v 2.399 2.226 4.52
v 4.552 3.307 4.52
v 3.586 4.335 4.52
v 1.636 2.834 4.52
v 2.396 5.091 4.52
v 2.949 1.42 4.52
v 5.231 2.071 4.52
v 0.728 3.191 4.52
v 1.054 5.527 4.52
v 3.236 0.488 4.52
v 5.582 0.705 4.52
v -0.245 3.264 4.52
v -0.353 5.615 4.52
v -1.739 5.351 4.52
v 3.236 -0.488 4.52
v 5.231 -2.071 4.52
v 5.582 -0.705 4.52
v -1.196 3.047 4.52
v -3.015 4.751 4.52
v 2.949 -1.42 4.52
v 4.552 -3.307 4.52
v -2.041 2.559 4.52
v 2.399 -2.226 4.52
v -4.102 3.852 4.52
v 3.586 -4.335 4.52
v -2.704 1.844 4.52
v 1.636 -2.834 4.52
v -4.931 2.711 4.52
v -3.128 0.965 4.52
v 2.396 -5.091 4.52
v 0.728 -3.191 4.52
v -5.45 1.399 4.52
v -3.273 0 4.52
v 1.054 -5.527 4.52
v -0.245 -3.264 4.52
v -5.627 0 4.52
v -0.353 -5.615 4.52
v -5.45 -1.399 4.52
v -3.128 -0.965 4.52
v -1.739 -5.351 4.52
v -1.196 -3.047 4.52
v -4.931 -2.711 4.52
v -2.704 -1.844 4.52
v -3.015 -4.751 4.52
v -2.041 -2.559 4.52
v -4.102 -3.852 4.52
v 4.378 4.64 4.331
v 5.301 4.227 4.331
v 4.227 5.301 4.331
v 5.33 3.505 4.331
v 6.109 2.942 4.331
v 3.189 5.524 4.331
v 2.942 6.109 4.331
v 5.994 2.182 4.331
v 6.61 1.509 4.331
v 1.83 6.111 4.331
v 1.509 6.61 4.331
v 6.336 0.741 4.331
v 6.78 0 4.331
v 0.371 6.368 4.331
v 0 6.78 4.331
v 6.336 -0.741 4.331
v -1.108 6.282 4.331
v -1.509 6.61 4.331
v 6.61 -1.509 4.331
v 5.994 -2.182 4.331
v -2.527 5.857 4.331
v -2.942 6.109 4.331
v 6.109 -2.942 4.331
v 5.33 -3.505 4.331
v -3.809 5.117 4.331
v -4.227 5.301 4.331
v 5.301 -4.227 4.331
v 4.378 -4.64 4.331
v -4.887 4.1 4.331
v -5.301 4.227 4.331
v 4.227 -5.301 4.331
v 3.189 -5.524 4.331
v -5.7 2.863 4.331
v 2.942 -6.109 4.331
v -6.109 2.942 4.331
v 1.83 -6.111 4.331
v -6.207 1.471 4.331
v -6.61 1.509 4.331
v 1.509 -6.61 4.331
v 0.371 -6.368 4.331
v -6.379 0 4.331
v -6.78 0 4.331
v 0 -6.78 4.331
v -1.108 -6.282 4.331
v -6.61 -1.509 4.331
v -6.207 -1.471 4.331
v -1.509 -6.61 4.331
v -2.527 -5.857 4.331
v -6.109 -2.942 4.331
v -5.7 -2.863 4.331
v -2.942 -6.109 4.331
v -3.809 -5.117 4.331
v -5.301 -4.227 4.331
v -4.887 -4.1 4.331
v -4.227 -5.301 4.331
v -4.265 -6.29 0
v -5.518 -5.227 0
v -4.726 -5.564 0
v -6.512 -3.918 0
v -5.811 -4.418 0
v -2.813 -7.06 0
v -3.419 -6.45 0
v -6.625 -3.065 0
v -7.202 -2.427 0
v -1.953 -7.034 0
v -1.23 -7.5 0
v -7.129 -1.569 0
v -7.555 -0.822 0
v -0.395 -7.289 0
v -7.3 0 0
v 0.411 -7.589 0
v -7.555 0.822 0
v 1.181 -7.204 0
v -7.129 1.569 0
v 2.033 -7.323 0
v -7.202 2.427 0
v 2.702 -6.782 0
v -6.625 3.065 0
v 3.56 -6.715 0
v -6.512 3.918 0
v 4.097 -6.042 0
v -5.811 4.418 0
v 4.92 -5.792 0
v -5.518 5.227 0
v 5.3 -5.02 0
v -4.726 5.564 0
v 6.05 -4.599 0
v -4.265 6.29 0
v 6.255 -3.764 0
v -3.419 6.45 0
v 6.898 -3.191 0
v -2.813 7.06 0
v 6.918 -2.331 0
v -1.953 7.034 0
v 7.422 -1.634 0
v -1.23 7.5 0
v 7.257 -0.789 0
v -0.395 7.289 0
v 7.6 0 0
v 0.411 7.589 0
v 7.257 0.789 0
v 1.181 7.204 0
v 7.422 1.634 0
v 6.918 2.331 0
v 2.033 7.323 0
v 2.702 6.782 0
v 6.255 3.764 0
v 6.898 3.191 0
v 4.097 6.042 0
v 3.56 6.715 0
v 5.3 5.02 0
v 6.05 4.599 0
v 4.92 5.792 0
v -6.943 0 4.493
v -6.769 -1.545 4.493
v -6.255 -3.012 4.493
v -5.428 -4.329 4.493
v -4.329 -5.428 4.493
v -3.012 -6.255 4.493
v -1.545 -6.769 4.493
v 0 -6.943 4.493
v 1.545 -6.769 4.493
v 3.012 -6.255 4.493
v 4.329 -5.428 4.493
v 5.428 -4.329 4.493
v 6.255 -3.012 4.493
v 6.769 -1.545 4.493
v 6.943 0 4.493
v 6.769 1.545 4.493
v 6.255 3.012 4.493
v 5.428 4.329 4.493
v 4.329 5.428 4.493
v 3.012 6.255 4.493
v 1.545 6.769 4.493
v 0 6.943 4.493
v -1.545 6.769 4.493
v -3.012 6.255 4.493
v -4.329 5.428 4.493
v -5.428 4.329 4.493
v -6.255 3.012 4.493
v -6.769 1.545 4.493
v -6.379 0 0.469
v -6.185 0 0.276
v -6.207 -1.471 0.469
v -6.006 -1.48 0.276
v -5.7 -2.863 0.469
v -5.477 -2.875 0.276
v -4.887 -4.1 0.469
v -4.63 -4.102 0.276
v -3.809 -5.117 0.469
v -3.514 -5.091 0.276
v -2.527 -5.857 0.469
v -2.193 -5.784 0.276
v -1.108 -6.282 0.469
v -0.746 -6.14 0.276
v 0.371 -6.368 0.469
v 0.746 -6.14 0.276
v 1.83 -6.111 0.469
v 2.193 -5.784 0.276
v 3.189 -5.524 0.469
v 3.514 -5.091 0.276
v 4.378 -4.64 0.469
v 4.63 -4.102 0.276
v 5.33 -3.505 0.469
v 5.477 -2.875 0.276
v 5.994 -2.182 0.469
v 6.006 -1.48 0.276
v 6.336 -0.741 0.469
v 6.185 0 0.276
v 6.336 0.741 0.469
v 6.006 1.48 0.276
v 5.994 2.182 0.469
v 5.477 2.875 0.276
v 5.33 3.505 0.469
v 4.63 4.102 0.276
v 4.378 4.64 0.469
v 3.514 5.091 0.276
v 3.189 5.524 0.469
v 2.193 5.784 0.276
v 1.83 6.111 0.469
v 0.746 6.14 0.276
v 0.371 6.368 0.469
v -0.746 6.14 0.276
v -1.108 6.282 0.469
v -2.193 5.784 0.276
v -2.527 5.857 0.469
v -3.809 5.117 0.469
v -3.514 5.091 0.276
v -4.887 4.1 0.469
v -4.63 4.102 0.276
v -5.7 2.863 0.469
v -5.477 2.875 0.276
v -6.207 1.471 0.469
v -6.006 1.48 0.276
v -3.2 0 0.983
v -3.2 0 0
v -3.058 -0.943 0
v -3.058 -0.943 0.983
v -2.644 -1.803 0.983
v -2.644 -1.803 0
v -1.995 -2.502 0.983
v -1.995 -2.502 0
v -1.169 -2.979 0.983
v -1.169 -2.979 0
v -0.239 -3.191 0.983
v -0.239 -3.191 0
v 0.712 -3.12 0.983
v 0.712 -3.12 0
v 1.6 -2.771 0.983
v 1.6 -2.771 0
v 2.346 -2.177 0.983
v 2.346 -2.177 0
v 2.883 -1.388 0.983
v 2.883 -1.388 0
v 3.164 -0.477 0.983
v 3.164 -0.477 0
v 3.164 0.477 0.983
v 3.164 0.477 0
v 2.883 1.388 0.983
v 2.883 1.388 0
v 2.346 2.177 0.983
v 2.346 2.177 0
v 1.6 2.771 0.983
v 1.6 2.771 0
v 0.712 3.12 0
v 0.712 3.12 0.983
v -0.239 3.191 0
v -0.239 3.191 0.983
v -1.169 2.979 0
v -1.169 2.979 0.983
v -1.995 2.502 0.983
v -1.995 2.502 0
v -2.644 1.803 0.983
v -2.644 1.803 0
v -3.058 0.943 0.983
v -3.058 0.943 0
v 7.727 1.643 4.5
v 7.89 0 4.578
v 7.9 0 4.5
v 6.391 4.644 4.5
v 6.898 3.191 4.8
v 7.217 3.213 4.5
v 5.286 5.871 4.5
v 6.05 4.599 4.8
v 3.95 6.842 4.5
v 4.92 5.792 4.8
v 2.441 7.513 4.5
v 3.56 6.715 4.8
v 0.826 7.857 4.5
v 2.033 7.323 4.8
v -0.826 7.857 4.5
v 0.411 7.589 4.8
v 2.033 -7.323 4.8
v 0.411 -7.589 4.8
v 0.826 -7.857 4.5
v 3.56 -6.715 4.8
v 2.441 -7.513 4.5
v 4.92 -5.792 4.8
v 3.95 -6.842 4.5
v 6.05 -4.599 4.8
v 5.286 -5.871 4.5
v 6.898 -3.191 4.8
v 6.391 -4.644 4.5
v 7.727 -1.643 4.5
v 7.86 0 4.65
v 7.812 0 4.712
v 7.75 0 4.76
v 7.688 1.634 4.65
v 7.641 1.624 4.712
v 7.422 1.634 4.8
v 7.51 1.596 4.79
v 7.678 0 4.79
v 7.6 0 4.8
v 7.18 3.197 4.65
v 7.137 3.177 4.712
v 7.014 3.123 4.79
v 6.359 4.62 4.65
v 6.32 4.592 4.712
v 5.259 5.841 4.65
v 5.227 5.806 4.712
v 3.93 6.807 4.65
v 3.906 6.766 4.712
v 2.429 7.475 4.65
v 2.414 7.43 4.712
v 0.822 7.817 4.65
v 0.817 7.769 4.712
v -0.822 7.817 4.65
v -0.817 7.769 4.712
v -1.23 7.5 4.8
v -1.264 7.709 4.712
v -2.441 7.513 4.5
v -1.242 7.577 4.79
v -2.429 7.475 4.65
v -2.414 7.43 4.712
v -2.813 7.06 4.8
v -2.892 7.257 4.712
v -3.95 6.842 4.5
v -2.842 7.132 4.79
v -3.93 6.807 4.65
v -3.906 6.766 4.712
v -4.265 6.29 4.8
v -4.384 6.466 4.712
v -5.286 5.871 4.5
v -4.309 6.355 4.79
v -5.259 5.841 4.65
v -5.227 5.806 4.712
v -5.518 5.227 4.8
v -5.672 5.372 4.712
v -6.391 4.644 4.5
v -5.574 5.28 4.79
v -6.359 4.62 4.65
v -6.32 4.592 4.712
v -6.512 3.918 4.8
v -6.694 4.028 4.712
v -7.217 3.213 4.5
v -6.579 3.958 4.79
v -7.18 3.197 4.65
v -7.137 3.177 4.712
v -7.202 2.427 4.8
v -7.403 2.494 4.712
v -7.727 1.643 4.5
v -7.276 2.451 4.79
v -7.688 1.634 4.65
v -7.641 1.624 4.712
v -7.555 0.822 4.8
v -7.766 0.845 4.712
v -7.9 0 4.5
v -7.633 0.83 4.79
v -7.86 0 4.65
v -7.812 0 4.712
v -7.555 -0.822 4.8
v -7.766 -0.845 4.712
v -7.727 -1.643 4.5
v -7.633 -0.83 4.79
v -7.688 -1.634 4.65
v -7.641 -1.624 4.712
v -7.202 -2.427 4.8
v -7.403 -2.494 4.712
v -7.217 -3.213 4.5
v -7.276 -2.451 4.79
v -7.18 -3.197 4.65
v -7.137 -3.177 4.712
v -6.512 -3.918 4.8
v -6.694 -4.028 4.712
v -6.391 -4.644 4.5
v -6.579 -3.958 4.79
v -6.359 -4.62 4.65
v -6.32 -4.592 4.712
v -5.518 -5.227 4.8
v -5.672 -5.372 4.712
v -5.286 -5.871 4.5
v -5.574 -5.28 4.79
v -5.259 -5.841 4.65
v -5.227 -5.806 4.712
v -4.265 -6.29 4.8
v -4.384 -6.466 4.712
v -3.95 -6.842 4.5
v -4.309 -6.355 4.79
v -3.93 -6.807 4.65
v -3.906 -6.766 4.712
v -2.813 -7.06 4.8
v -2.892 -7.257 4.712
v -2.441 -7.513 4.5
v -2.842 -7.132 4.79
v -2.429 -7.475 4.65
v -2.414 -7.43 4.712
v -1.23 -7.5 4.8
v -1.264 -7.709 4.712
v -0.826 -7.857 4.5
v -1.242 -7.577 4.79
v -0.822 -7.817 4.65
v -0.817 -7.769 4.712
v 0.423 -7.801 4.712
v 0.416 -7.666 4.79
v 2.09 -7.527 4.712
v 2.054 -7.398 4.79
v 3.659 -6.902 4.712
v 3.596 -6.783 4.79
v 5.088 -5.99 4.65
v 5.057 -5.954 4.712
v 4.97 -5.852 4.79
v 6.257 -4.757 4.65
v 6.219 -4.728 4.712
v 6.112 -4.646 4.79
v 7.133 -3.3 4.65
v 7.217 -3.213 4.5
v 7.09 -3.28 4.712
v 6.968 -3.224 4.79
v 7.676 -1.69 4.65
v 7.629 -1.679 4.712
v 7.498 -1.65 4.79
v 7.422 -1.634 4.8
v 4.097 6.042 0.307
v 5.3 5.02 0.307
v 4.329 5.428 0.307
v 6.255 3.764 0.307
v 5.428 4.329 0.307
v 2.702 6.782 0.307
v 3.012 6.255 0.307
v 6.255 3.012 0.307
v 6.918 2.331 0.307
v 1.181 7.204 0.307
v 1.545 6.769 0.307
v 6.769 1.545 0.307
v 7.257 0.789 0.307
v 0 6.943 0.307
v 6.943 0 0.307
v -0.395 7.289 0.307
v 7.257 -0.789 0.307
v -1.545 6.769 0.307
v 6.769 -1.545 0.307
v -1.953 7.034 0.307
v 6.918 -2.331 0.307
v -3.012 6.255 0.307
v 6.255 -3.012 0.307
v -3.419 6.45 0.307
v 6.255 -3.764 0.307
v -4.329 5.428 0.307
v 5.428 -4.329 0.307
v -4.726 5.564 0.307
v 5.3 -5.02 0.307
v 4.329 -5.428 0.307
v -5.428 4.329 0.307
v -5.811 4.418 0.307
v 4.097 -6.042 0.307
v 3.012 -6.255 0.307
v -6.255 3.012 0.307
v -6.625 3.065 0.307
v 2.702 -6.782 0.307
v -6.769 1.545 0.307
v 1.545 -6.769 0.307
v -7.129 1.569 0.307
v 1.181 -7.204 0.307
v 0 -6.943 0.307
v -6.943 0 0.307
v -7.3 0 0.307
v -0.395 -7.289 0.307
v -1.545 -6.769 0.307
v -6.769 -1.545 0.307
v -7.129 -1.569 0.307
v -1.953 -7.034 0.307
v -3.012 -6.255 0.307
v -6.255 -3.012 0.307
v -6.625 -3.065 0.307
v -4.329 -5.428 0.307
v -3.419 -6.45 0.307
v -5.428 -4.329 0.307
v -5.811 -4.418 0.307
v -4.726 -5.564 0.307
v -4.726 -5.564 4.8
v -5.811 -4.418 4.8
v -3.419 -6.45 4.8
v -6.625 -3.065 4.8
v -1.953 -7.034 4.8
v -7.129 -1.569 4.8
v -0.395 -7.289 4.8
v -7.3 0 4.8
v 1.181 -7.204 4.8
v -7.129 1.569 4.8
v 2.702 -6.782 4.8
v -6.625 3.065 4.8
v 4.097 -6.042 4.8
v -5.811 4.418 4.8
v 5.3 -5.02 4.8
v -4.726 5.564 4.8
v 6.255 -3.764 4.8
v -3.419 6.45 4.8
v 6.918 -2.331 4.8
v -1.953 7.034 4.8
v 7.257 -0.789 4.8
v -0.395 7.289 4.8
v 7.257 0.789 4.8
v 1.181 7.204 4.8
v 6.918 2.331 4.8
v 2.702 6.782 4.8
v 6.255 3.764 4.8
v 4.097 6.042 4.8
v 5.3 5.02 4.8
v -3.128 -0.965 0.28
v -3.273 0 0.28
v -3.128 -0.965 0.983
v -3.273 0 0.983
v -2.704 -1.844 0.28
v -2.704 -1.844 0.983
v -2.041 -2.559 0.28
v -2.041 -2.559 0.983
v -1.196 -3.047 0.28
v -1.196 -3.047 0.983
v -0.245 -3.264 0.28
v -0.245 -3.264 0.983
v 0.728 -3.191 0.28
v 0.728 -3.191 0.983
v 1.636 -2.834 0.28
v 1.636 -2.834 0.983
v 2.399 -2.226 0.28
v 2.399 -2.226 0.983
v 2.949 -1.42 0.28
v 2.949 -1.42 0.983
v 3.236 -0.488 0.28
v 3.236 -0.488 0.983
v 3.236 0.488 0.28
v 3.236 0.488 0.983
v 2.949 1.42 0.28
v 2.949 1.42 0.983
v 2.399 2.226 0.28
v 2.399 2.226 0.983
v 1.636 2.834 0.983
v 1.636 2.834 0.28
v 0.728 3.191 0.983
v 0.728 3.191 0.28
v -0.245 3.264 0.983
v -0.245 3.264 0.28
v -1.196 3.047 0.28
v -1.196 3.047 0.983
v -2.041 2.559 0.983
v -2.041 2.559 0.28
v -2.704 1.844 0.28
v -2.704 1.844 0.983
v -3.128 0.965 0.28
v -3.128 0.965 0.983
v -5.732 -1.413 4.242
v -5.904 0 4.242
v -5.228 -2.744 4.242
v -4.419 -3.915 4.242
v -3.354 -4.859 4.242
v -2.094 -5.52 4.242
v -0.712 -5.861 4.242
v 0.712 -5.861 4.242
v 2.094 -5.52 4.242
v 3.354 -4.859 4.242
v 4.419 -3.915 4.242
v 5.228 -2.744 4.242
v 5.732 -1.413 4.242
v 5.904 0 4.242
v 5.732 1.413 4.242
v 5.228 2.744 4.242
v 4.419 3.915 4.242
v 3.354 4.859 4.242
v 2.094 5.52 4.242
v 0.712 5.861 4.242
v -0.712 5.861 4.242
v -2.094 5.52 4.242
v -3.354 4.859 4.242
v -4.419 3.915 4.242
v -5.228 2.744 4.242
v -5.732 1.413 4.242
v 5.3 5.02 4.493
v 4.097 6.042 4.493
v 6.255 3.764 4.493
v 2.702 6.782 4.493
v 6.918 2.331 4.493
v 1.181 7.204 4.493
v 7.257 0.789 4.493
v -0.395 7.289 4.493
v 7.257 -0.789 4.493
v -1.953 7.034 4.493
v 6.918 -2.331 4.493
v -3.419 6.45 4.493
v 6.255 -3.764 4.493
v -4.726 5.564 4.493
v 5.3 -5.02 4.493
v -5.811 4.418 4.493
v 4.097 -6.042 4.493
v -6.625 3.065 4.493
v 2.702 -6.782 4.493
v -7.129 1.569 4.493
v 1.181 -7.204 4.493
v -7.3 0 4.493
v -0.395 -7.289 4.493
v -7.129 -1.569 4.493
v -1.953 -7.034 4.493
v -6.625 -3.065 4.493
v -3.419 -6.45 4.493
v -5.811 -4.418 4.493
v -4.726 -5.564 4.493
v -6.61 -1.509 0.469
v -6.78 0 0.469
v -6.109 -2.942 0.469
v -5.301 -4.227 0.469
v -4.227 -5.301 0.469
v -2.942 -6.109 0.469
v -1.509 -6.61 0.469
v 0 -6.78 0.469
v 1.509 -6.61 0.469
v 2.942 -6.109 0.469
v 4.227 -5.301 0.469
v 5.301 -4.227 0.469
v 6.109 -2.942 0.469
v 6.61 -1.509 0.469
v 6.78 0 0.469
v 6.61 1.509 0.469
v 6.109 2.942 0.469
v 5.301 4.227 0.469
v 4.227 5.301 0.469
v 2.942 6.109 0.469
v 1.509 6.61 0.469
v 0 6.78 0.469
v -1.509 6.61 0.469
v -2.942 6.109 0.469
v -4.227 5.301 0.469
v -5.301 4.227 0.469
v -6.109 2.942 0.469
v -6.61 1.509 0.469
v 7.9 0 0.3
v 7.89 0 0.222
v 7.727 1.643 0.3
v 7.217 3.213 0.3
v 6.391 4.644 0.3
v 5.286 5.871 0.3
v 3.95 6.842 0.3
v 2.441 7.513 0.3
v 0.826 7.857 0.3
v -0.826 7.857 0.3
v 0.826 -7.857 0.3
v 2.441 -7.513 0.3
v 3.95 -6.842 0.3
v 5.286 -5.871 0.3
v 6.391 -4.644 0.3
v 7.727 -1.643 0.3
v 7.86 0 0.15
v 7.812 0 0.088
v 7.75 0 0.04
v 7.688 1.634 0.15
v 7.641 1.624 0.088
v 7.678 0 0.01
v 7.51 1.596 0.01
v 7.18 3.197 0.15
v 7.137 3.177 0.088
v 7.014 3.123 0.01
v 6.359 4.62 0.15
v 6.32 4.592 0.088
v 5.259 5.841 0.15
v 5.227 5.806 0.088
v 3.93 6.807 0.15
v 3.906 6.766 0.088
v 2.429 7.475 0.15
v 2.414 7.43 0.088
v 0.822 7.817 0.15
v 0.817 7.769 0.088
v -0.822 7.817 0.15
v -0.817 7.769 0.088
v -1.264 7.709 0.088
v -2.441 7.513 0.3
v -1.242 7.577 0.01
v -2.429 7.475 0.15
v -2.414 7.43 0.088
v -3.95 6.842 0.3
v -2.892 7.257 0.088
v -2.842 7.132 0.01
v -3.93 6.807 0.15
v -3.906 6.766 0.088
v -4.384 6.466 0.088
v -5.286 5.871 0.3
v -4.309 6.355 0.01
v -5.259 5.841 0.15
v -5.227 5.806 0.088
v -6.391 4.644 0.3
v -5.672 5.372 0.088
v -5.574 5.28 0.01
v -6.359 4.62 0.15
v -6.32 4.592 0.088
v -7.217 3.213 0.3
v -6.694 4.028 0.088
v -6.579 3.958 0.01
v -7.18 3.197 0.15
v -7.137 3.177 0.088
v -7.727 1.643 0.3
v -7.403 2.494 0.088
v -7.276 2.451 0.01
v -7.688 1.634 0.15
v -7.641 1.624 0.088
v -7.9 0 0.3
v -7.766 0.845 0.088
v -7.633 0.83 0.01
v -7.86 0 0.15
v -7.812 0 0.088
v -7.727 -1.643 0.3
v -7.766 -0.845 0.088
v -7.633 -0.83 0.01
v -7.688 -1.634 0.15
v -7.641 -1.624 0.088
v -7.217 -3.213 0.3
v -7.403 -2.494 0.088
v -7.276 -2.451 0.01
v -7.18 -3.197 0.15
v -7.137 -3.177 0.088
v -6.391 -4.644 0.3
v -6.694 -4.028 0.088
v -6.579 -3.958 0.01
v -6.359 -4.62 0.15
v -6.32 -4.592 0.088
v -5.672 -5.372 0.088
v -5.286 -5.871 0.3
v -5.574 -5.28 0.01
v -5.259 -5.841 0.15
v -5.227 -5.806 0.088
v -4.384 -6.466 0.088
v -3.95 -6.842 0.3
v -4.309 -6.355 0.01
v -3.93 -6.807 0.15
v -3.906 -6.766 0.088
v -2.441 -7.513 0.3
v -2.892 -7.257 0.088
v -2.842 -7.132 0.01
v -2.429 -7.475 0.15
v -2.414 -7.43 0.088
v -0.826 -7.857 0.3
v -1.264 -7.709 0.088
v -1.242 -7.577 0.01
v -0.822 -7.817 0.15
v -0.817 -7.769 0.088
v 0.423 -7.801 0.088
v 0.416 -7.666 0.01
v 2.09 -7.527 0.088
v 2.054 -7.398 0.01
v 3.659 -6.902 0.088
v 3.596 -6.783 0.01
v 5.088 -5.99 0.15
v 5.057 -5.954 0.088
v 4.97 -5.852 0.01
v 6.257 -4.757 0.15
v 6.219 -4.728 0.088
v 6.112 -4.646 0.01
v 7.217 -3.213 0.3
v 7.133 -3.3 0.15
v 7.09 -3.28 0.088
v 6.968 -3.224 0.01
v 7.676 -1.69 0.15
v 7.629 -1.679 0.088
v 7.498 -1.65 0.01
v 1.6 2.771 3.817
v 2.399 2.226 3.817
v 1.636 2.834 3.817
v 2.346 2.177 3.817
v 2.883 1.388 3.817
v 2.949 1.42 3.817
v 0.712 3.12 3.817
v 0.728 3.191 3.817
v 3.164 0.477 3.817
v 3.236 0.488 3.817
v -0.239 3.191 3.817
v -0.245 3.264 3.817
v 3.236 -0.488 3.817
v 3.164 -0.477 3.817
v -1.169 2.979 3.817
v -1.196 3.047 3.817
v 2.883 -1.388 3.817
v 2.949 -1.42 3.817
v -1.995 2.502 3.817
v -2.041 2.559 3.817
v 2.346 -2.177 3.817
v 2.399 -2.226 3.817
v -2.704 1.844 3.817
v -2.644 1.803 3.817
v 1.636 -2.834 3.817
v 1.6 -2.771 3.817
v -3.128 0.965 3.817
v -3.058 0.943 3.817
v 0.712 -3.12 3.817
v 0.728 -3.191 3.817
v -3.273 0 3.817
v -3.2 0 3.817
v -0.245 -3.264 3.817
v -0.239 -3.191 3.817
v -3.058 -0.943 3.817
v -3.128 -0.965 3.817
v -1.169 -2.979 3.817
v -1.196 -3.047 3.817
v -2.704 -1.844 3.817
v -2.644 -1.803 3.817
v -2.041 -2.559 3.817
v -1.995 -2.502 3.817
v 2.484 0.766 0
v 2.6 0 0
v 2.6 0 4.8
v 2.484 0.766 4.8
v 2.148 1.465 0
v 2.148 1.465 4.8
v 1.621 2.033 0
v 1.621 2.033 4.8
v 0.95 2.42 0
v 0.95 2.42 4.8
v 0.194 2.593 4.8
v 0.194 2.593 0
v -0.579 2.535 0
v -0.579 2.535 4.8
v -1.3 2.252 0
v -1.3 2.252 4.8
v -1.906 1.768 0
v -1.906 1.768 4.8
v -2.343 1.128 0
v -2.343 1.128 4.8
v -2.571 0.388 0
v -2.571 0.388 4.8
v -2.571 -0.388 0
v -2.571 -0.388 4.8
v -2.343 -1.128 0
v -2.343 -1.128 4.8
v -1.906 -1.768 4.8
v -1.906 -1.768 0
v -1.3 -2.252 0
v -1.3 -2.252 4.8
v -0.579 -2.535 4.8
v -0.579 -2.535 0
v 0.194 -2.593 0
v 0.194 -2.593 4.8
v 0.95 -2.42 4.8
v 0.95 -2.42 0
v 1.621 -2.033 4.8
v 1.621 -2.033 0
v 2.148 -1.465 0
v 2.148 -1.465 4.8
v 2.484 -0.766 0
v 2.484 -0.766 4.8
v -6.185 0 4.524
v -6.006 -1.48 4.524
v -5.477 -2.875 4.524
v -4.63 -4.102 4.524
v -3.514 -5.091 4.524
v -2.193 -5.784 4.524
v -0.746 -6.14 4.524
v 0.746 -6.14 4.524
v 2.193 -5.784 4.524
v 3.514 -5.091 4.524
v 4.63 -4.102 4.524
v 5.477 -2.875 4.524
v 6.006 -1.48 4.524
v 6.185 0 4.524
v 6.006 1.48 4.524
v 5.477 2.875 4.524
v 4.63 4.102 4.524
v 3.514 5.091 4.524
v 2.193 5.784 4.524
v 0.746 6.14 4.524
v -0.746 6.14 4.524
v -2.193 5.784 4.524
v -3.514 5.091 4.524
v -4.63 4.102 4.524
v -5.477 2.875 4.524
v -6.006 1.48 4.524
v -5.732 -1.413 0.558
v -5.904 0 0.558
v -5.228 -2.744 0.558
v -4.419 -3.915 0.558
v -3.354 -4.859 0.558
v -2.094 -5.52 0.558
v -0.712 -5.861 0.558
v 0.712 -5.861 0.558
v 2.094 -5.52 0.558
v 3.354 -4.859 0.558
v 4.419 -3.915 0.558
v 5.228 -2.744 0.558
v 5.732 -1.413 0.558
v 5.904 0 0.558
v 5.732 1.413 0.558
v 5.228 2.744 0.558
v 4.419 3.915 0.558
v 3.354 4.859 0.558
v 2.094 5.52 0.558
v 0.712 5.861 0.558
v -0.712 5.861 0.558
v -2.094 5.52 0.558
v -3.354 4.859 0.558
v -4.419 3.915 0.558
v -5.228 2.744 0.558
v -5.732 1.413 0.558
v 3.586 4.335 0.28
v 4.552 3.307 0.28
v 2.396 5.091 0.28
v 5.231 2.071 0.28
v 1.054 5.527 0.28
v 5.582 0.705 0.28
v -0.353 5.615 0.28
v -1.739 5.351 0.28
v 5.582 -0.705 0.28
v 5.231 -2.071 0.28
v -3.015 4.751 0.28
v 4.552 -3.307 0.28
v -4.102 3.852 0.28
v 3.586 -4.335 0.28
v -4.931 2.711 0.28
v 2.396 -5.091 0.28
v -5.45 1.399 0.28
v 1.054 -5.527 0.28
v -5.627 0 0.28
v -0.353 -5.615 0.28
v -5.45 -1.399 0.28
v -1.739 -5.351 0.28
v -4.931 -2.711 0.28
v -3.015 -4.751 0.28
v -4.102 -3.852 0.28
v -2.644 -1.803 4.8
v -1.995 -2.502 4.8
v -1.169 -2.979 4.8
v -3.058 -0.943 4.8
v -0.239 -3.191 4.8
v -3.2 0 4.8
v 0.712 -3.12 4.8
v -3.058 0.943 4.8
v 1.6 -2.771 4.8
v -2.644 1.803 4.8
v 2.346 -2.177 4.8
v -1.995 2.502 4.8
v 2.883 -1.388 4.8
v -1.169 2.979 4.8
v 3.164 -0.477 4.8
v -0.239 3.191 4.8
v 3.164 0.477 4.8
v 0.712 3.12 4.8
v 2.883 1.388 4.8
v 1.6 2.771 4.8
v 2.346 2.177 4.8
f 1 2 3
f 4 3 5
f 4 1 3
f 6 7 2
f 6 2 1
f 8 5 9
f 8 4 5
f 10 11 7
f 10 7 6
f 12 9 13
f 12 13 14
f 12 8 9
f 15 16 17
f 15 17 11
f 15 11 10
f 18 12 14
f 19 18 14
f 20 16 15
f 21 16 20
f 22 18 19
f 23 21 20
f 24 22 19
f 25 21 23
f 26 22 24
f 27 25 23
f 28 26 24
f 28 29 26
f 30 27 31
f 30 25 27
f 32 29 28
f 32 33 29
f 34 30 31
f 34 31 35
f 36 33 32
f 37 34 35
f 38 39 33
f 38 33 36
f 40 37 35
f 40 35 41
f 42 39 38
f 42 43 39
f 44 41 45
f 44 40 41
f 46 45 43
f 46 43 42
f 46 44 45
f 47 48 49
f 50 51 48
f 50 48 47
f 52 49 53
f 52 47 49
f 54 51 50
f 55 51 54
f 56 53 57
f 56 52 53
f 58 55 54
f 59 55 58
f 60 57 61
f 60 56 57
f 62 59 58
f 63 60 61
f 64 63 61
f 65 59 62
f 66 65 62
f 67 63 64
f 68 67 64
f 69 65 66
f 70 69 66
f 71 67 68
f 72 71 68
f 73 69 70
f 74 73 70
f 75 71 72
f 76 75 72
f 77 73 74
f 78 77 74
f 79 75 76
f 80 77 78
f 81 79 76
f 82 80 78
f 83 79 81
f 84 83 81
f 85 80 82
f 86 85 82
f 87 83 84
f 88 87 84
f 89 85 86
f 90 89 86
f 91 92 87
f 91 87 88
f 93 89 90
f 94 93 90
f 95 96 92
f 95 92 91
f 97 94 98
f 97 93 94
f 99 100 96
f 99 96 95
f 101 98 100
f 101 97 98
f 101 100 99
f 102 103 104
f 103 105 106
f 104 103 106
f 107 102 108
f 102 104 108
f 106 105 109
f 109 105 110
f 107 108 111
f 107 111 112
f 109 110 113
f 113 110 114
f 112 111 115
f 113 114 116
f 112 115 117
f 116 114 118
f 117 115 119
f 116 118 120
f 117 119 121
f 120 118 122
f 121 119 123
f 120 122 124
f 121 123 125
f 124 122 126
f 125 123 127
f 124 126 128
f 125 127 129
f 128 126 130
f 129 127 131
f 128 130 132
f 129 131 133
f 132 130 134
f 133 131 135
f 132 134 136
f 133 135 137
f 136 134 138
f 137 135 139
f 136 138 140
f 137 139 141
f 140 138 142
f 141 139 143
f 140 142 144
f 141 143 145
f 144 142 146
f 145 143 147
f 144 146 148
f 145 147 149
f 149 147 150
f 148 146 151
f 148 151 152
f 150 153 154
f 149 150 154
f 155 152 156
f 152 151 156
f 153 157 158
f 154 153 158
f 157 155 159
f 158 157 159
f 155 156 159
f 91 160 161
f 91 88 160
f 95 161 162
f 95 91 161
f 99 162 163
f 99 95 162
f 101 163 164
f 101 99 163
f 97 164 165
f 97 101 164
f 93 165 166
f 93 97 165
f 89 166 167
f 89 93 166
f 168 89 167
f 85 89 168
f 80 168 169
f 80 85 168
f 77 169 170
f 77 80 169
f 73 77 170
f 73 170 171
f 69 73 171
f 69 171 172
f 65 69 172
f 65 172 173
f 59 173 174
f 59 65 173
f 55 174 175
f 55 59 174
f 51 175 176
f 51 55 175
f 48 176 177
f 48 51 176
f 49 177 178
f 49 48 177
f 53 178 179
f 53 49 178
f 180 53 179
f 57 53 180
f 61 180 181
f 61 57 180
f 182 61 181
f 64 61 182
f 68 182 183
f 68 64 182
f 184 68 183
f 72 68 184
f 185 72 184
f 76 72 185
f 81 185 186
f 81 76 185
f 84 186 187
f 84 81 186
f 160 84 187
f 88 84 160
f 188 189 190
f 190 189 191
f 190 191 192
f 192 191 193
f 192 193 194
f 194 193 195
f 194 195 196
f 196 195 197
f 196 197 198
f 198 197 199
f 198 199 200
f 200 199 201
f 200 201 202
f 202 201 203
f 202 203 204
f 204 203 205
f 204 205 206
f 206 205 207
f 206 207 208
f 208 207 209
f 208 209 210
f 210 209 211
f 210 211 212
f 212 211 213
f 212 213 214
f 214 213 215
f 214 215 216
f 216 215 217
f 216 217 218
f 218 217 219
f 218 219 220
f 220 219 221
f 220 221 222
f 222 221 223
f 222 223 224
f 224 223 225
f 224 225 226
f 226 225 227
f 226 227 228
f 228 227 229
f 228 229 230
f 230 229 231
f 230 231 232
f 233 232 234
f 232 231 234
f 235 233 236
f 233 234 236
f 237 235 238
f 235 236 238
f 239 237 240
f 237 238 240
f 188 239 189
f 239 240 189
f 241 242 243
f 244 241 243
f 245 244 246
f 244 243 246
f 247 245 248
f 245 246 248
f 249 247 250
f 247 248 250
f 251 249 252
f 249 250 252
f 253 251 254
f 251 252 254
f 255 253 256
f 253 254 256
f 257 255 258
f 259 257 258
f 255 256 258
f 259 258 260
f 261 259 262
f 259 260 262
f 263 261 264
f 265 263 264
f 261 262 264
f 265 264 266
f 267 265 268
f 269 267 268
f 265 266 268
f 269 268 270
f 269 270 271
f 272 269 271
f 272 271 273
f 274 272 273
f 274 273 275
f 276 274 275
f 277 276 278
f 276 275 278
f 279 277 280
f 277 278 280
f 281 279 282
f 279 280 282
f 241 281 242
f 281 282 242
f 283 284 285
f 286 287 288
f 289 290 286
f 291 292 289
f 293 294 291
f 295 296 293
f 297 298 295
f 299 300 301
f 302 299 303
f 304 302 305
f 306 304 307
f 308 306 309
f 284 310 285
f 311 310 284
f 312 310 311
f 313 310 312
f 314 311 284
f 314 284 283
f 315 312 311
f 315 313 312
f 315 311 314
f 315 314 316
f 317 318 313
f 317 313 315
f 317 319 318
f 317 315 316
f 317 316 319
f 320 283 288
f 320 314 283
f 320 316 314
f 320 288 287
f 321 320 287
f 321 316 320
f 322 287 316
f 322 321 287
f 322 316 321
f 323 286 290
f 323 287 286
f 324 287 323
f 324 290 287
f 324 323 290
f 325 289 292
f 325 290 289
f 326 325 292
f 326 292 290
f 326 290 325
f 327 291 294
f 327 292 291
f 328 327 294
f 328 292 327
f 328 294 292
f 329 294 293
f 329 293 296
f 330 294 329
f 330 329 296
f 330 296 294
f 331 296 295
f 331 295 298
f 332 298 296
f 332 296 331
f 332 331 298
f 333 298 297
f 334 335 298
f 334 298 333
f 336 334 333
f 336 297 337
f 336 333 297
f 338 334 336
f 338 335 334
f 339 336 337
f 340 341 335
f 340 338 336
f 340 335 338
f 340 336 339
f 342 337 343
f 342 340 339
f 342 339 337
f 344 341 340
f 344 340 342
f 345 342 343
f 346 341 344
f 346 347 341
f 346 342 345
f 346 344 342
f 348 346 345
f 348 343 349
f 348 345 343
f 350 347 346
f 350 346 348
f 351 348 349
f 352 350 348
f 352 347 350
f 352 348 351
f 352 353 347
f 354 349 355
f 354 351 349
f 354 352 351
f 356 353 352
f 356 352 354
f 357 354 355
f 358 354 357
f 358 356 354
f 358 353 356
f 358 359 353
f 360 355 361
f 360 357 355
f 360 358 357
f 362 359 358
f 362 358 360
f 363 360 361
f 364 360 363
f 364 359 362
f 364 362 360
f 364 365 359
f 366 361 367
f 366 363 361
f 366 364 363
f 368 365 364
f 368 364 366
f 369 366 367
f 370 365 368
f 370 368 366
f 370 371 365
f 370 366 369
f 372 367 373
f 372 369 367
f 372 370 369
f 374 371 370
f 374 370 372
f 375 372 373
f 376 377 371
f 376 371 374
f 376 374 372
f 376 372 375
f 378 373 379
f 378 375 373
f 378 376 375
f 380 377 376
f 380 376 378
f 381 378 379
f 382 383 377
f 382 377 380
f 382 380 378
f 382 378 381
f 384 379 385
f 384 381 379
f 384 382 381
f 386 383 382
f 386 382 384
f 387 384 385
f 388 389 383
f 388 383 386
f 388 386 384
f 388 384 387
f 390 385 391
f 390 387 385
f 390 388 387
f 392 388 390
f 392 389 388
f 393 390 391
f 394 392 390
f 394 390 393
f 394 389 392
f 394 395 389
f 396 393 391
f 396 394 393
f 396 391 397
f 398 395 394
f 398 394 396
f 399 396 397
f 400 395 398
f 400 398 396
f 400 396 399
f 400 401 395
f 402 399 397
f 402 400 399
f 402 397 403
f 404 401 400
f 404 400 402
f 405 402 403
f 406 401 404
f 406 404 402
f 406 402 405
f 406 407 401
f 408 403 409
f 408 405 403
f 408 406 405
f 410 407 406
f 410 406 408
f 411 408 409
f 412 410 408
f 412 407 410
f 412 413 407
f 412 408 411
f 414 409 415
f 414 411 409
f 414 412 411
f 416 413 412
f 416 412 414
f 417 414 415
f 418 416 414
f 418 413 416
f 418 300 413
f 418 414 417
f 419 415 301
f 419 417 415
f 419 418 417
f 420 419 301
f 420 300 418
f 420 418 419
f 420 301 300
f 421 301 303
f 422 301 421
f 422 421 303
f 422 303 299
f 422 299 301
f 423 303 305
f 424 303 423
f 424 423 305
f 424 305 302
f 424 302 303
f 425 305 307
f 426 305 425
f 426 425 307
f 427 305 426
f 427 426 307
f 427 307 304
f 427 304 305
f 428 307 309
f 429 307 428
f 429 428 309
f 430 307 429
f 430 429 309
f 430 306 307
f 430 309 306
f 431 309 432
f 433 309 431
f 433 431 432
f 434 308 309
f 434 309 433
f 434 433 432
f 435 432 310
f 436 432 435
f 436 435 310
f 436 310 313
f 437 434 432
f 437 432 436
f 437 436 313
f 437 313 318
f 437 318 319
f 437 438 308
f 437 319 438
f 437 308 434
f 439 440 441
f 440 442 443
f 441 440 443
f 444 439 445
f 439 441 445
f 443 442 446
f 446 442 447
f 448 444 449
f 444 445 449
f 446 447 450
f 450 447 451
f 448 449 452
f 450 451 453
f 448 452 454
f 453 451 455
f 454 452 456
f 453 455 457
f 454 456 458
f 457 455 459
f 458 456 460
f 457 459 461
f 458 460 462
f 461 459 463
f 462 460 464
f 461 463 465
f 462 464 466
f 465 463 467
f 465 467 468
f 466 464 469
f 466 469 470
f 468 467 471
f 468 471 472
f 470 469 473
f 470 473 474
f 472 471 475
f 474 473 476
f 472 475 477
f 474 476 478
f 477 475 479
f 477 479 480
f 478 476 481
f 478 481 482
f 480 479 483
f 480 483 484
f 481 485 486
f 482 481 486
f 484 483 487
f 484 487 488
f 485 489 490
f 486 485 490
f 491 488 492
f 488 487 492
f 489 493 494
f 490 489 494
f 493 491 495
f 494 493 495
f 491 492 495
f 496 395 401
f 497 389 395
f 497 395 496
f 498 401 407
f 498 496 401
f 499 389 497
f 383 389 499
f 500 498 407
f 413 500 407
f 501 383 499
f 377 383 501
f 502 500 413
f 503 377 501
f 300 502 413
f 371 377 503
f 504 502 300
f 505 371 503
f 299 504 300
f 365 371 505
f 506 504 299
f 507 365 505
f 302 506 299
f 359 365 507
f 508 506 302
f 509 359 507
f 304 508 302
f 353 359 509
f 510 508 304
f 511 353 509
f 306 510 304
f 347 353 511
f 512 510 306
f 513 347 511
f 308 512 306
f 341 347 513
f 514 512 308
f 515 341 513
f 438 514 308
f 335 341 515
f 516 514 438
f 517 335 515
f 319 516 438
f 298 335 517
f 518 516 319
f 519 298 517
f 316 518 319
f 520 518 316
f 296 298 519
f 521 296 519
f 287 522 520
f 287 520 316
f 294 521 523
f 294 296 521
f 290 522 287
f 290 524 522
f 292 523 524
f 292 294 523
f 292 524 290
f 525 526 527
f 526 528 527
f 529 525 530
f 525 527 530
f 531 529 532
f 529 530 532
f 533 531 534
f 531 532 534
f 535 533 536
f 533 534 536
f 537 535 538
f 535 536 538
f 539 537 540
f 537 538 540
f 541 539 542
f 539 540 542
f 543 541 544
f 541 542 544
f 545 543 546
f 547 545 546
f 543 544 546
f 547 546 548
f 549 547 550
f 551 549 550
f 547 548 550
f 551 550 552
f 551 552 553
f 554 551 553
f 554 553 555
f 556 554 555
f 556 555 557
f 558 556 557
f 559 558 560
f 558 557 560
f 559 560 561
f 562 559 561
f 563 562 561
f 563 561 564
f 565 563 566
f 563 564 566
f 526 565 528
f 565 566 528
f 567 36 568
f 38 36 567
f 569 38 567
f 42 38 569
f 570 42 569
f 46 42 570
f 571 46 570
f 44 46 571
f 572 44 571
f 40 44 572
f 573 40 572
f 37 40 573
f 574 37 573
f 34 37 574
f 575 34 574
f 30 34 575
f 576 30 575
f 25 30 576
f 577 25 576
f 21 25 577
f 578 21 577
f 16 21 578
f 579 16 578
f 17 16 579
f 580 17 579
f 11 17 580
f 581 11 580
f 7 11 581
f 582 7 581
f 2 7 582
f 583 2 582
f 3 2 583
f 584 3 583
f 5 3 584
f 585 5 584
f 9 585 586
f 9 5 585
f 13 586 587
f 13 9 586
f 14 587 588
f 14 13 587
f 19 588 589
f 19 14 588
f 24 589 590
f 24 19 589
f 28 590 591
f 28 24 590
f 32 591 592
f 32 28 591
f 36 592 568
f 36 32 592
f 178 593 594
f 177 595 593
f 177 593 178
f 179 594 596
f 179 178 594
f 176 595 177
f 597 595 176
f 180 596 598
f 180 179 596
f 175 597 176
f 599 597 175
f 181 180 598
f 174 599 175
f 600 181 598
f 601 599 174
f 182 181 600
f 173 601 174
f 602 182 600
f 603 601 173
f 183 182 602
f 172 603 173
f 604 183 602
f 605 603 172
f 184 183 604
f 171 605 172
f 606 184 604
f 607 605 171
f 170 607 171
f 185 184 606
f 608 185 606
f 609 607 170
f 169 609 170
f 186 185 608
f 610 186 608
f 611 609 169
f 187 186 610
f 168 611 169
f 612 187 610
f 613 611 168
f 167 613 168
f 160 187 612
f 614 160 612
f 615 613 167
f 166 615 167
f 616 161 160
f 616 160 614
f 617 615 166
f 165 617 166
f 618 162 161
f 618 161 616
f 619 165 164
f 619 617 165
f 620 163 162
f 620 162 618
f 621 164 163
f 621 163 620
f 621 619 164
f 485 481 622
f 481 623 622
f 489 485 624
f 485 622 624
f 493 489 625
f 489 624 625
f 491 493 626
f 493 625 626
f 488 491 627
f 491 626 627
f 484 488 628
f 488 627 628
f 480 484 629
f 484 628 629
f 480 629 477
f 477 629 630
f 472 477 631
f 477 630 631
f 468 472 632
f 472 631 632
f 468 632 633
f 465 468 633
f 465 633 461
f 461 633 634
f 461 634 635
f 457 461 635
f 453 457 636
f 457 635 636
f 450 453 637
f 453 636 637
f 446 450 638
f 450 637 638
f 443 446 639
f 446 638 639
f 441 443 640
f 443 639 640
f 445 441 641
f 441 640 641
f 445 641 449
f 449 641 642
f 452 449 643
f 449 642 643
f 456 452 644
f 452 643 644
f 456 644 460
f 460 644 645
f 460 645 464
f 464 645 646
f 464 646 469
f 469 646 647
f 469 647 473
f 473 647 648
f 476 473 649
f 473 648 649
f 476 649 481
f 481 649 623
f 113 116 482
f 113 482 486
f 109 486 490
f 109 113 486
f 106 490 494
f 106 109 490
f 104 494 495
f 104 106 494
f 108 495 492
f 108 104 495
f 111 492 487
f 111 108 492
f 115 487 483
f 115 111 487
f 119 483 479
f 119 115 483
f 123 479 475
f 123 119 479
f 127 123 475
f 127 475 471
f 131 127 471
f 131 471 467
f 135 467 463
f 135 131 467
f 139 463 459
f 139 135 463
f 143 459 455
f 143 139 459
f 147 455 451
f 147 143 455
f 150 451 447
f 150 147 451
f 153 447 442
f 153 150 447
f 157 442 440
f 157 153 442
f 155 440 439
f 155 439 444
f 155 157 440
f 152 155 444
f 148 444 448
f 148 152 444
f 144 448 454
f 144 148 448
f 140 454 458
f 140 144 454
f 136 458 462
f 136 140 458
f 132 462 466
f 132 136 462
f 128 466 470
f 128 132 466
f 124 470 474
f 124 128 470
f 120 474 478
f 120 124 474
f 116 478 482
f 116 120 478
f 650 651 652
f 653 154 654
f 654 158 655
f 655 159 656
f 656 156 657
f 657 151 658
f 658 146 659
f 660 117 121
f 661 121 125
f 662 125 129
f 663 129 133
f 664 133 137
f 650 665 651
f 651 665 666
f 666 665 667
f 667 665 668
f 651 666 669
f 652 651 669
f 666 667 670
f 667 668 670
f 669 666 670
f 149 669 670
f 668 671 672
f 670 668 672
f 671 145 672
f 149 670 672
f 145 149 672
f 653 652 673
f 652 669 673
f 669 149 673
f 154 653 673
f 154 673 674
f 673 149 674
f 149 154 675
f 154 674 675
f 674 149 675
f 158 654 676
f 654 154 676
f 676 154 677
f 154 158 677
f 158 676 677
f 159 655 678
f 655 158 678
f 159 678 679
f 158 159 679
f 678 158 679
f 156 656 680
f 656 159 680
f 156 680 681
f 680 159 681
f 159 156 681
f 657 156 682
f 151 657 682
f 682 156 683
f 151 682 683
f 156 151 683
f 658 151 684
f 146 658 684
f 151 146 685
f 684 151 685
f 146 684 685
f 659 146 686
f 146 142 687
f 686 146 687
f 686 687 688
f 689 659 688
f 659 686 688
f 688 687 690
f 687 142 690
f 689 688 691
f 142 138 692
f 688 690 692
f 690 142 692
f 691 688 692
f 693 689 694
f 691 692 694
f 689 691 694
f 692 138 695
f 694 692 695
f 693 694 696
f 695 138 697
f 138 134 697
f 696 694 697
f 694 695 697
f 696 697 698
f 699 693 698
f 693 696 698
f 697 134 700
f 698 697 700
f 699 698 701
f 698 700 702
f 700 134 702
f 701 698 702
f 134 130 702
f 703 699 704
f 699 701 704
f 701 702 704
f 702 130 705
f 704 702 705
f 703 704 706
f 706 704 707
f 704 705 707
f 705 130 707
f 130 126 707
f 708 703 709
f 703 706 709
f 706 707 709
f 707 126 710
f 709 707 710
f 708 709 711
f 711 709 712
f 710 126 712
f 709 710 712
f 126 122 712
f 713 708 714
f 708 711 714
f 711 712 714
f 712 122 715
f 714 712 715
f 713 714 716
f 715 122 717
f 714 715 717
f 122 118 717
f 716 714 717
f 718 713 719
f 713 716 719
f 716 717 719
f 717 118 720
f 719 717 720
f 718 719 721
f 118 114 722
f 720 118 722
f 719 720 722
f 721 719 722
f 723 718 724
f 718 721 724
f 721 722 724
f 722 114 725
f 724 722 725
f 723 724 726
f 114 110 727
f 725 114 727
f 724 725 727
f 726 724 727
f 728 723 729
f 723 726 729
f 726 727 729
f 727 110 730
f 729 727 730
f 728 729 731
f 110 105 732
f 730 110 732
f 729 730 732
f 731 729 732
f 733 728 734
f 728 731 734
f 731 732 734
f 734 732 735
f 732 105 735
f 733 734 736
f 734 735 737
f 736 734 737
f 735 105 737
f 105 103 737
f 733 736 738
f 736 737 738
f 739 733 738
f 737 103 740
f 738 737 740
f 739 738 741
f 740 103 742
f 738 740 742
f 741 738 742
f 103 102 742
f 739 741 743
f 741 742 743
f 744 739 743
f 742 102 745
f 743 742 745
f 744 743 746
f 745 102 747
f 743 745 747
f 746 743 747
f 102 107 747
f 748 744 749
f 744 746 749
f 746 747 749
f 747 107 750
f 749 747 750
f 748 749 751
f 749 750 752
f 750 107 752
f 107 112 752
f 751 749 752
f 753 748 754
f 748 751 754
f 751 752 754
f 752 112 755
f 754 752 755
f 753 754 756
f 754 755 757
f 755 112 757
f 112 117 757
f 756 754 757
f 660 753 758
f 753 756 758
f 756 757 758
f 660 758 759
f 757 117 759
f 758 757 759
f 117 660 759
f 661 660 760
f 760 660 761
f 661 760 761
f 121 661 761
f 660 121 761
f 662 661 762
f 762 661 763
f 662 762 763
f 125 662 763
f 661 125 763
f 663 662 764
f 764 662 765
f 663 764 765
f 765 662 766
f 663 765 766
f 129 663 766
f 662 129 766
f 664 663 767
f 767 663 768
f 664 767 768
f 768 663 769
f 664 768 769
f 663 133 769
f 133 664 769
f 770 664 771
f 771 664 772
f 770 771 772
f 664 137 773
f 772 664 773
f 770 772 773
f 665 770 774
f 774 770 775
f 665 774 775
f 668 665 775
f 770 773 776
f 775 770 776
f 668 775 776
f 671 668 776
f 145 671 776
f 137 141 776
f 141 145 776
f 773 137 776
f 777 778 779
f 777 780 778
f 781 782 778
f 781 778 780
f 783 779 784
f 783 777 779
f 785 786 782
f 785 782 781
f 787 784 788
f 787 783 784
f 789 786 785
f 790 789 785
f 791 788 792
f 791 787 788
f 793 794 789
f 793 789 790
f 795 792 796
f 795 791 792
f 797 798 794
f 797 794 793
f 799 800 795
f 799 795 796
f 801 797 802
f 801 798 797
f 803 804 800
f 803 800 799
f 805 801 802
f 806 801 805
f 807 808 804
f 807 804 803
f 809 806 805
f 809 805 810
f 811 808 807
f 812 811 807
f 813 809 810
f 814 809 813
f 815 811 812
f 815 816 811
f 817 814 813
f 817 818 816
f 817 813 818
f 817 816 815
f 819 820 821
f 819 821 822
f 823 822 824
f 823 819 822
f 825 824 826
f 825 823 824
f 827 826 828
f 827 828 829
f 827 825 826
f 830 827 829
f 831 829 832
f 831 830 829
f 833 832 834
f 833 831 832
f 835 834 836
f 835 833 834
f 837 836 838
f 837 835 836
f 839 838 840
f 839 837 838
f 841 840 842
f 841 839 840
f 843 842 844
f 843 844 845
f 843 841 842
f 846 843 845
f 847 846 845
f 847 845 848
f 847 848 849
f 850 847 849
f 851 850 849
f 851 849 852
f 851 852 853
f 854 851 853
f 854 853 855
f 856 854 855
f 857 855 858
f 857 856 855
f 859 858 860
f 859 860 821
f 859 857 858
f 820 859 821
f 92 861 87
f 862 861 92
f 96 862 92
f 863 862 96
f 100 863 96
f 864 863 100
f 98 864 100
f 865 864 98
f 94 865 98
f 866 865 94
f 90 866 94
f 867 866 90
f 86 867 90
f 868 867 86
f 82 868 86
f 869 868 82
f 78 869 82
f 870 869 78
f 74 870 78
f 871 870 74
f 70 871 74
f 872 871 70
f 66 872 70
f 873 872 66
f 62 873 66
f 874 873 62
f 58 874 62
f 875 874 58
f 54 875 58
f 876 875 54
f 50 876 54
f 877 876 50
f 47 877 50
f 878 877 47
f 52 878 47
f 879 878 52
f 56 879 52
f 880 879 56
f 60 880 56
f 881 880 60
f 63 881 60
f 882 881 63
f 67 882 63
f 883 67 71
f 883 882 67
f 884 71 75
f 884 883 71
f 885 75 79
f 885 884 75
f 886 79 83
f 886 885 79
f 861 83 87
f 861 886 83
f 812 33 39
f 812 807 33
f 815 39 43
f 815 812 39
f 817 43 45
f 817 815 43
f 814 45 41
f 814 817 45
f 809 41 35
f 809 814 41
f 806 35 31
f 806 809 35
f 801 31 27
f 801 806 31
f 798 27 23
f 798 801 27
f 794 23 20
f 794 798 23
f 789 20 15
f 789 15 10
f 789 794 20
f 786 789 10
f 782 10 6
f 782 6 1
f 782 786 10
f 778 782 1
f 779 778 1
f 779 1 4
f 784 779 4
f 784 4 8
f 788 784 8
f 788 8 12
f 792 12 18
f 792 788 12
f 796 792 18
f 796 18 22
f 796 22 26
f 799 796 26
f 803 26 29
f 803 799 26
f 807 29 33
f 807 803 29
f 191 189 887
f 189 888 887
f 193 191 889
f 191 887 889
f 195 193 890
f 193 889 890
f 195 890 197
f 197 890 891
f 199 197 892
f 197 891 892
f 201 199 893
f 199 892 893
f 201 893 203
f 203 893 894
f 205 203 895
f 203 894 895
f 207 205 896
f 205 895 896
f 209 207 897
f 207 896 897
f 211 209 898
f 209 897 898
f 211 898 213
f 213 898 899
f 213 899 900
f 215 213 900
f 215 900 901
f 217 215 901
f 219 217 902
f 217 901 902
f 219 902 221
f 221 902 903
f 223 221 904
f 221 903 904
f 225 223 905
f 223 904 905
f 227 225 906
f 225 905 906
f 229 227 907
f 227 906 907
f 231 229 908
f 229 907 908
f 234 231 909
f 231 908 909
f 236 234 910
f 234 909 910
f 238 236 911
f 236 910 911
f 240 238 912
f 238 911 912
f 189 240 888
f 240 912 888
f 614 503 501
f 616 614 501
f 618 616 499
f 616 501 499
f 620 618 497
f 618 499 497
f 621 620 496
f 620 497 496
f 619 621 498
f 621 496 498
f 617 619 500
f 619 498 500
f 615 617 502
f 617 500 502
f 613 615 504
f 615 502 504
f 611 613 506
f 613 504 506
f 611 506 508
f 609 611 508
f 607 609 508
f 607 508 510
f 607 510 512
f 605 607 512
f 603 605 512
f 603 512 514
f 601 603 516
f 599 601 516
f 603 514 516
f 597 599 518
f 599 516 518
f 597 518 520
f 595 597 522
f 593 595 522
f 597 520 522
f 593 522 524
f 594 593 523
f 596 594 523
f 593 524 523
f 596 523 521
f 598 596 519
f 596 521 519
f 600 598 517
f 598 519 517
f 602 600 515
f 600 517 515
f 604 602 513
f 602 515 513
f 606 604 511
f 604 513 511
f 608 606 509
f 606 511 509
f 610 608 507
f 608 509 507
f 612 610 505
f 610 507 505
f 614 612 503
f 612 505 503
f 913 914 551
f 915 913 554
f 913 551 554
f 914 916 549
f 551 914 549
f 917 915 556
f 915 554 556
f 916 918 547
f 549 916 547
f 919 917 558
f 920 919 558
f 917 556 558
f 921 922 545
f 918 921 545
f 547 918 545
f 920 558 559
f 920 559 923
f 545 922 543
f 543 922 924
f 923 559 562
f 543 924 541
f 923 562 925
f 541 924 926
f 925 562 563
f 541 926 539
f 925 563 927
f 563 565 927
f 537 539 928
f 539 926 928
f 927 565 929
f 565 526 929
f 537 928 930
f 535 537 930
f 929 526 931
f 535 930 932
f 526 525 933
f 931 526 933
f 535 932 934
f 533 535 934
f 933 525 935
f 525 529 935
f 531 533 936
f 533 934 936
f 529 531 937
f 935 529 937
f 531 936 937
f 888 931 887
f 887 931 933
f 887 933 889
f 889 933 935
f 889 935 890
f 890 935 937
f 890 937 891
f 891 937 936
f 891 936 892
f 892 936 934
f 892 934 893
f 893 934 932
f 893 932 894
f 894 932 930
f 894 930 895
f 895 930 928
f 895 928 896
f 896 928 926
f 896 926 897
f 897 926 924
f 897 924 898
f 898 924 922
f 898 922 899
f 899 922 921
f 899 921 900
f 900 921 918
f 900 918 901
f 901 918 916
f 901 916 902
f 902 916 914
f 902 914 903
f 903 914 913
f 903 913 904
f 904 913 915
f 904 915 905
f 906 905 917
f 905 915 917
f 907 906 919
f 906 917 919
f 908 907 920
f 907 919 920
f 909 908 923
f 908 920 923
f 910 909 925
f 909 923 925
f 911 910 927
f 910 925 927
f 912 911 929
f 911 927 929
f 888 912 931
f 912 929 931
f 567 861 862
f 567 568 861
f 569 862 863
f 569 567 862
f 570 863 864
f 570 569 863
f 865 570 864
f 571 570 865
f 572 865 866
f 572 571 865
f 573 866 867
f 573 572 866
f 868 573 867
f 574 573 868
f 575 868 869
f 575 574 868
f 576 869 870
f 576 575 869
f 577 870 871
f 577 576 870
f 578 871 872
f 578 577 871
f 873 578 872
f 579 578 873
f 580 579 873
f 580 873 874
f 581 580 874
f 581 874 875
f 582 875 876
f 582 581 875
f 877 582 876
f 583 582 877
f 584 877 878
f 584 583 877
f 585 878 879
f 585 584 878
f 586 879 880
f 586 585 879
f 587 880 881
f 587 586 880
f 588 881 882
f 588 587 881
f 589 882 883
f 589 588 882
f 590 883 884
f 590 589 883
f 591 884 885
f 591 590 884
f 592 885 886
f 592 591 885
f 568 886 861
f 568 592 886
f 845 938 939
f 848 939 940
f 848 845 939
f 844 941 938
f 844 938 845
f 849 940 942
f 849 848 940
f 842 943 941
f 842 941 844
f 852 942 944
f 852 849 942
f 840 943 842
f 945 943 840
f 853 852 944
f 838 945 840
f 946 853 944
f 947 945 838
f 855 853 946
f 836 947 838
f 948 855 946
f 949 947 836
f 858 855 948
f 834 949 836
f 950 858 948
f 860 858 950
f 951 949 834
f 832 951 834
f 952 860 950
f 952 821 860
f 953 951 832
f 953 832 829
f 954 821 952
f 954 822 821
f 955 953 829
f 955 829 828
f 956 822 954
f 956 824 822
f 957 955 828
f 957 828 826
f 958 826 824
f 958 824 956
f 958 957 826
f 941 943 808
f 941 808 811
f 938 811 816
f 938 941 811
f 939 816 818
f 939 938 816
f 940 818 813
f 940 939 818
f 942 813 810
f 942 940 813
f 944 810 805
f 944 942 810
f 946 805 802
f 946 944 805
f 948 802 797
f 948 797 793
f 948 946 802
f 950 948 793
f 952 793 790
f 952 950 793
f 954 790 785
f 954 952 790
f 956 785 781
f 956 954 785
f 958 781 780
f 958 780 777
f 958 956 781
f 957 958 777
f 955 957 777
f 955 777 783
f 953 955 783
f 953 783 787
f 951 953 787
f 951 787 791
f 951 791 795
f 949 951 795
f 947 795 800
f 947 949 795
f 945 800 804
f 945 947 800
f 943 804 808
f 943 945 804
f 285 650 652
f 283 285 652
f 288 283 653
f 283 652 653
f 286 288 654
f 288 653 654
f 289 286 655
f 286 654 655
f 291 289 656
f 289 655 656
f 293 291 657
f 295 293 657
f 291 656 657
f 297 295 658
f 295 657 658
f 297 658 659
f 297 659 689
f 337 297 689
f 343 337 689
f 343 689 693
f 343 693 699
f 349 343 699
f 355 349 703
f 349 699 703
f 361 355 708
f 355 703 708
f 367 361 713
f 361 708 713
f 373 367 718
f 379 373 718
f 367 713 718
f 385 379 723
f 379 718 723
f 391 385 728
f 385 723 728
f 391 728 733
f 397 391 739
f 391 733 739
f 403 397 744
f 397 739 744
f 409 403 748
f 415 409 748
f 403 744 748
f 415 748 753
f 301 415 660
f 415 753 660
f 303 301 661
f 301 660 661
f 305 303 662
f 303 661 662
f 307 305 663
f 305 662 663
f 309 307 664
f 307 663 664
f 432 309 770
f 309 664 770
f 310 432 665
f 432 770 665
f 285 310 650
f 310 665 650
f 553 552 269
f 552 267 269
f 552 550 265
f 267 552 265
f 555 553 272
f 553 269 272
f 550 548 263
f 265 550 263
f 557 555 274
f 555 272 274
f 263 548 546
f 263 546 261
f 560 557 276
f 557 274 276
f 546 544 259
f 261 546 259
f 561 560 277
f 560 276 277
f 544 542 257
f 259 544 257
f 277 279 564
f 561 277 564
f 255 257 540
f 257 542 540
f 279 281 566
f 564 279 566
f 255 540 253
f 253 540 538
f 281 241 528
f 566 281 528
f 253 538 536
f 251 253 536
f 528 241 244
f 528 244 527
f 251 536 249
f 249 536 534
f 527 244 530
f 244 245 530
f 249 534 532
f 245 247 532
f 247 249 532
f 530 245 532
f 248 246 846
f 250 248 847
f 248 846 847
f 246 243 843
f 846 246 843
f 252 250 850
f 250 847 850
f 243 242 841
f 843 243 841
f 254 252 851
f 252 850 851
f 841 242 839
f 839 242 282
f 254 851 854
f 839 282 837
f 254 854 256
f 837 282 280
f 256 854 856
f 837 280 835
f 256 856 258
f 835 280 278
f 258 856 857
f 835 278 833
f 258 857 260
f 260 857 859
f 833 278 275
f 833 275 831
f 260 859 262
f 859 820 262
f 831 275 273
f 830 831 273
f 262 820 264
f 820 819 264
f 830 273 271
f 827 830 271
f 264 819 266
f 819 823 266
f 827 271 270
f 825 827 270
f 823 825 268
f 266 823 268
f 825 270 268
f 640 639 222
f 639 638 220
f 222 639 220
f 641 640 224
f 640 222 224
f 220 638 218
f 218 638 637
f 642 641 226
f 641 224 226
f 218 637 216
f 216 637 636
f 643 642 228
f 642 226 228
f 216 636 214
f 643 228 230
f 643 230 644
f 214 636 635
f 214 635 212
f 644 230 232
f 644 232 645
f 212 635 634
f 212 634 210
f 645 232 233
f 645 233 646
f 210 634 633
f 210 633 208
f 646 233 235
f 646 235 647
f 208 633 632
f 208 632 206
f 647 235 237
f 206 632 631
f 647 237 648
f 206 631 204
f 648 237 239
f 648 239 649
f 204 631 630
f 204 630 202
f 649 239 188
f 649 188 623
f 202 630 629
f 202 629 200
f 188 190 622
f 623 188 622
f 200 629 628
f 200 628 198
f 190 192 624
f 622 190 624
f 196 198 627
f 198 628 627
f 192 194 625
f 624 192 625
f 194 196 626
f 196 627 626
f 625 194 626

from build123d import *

# Parameters (mm, degrees)
SKETCH1_R           = 7.9
SKETCH1_R_2         = 2.6
BOSS_EXTRUDE1_DEPTH = 4.8
FILLET1_R           = 0.3


with BuildPart() as part:
    # Sketch1 → Boss-Extrude1 (new body)
    with BuildSketch(Plane.XY):
        Circle(SKETCH1_R)
        Circle(SKETCH1_R_2, mode=Mode.SUBTRACT)
    extrude(amount=BOSS_EXTRUDE1_DEPTH)

    # Sketch2 → Cut-Revolve1 (revolve, cut)
    with BuildSketch(Plane(origin=(0, 0, 0), x_dir=(0, 0, -1), z_dir=(1, 0, 0)), mode=Mode.PRIVATE) as cut_revolve1_sk:
        Polygon((-5.02377309, 7.3), (-4.492956226, 7.3), (-4.492956226, 6.942652627), (-4.330576131, 6.780272532), (-4.330576131, 6.378958324), (-4.524078417, 6.185456038), (-4.242386553, 5.903764175), (-4.519629847, 5.626520881), (-4.519629847, 3.272939667), (-3.81743033, 3.272939667), (-3.81743033, 3.2), (-4.879732163, 3.2), (-4.879732163, 0), (-5.869193326, 0), (-5.869193326, 7.3), align=None)
    cut_revolve1 = revolve(cut_revolve1_sk.sketch.rotate(Axis((0, 0, 4.879732163), (0, 0, 1)), 90), axis=Axis((0, 0, 4.879732163), (0, 0, 1)), mode=Mode.SUBTRACT)

    # Mirror1: Cut-Revolve1 across plane
    add(cut_revolve1.mirror(Plane.XY.offset(2.4)), mode=Mode.SUBTRACT)

    # Fillet1
    fillet1_edges = [part.edges().sort_by_distance(p)[0] for p in [
        (-7.9, 0, 0),
        (-7.9, 0, 4.8),
    ]]
    fillet(fillet1_edges, radius=FILLET1_R)


solid = part.part
